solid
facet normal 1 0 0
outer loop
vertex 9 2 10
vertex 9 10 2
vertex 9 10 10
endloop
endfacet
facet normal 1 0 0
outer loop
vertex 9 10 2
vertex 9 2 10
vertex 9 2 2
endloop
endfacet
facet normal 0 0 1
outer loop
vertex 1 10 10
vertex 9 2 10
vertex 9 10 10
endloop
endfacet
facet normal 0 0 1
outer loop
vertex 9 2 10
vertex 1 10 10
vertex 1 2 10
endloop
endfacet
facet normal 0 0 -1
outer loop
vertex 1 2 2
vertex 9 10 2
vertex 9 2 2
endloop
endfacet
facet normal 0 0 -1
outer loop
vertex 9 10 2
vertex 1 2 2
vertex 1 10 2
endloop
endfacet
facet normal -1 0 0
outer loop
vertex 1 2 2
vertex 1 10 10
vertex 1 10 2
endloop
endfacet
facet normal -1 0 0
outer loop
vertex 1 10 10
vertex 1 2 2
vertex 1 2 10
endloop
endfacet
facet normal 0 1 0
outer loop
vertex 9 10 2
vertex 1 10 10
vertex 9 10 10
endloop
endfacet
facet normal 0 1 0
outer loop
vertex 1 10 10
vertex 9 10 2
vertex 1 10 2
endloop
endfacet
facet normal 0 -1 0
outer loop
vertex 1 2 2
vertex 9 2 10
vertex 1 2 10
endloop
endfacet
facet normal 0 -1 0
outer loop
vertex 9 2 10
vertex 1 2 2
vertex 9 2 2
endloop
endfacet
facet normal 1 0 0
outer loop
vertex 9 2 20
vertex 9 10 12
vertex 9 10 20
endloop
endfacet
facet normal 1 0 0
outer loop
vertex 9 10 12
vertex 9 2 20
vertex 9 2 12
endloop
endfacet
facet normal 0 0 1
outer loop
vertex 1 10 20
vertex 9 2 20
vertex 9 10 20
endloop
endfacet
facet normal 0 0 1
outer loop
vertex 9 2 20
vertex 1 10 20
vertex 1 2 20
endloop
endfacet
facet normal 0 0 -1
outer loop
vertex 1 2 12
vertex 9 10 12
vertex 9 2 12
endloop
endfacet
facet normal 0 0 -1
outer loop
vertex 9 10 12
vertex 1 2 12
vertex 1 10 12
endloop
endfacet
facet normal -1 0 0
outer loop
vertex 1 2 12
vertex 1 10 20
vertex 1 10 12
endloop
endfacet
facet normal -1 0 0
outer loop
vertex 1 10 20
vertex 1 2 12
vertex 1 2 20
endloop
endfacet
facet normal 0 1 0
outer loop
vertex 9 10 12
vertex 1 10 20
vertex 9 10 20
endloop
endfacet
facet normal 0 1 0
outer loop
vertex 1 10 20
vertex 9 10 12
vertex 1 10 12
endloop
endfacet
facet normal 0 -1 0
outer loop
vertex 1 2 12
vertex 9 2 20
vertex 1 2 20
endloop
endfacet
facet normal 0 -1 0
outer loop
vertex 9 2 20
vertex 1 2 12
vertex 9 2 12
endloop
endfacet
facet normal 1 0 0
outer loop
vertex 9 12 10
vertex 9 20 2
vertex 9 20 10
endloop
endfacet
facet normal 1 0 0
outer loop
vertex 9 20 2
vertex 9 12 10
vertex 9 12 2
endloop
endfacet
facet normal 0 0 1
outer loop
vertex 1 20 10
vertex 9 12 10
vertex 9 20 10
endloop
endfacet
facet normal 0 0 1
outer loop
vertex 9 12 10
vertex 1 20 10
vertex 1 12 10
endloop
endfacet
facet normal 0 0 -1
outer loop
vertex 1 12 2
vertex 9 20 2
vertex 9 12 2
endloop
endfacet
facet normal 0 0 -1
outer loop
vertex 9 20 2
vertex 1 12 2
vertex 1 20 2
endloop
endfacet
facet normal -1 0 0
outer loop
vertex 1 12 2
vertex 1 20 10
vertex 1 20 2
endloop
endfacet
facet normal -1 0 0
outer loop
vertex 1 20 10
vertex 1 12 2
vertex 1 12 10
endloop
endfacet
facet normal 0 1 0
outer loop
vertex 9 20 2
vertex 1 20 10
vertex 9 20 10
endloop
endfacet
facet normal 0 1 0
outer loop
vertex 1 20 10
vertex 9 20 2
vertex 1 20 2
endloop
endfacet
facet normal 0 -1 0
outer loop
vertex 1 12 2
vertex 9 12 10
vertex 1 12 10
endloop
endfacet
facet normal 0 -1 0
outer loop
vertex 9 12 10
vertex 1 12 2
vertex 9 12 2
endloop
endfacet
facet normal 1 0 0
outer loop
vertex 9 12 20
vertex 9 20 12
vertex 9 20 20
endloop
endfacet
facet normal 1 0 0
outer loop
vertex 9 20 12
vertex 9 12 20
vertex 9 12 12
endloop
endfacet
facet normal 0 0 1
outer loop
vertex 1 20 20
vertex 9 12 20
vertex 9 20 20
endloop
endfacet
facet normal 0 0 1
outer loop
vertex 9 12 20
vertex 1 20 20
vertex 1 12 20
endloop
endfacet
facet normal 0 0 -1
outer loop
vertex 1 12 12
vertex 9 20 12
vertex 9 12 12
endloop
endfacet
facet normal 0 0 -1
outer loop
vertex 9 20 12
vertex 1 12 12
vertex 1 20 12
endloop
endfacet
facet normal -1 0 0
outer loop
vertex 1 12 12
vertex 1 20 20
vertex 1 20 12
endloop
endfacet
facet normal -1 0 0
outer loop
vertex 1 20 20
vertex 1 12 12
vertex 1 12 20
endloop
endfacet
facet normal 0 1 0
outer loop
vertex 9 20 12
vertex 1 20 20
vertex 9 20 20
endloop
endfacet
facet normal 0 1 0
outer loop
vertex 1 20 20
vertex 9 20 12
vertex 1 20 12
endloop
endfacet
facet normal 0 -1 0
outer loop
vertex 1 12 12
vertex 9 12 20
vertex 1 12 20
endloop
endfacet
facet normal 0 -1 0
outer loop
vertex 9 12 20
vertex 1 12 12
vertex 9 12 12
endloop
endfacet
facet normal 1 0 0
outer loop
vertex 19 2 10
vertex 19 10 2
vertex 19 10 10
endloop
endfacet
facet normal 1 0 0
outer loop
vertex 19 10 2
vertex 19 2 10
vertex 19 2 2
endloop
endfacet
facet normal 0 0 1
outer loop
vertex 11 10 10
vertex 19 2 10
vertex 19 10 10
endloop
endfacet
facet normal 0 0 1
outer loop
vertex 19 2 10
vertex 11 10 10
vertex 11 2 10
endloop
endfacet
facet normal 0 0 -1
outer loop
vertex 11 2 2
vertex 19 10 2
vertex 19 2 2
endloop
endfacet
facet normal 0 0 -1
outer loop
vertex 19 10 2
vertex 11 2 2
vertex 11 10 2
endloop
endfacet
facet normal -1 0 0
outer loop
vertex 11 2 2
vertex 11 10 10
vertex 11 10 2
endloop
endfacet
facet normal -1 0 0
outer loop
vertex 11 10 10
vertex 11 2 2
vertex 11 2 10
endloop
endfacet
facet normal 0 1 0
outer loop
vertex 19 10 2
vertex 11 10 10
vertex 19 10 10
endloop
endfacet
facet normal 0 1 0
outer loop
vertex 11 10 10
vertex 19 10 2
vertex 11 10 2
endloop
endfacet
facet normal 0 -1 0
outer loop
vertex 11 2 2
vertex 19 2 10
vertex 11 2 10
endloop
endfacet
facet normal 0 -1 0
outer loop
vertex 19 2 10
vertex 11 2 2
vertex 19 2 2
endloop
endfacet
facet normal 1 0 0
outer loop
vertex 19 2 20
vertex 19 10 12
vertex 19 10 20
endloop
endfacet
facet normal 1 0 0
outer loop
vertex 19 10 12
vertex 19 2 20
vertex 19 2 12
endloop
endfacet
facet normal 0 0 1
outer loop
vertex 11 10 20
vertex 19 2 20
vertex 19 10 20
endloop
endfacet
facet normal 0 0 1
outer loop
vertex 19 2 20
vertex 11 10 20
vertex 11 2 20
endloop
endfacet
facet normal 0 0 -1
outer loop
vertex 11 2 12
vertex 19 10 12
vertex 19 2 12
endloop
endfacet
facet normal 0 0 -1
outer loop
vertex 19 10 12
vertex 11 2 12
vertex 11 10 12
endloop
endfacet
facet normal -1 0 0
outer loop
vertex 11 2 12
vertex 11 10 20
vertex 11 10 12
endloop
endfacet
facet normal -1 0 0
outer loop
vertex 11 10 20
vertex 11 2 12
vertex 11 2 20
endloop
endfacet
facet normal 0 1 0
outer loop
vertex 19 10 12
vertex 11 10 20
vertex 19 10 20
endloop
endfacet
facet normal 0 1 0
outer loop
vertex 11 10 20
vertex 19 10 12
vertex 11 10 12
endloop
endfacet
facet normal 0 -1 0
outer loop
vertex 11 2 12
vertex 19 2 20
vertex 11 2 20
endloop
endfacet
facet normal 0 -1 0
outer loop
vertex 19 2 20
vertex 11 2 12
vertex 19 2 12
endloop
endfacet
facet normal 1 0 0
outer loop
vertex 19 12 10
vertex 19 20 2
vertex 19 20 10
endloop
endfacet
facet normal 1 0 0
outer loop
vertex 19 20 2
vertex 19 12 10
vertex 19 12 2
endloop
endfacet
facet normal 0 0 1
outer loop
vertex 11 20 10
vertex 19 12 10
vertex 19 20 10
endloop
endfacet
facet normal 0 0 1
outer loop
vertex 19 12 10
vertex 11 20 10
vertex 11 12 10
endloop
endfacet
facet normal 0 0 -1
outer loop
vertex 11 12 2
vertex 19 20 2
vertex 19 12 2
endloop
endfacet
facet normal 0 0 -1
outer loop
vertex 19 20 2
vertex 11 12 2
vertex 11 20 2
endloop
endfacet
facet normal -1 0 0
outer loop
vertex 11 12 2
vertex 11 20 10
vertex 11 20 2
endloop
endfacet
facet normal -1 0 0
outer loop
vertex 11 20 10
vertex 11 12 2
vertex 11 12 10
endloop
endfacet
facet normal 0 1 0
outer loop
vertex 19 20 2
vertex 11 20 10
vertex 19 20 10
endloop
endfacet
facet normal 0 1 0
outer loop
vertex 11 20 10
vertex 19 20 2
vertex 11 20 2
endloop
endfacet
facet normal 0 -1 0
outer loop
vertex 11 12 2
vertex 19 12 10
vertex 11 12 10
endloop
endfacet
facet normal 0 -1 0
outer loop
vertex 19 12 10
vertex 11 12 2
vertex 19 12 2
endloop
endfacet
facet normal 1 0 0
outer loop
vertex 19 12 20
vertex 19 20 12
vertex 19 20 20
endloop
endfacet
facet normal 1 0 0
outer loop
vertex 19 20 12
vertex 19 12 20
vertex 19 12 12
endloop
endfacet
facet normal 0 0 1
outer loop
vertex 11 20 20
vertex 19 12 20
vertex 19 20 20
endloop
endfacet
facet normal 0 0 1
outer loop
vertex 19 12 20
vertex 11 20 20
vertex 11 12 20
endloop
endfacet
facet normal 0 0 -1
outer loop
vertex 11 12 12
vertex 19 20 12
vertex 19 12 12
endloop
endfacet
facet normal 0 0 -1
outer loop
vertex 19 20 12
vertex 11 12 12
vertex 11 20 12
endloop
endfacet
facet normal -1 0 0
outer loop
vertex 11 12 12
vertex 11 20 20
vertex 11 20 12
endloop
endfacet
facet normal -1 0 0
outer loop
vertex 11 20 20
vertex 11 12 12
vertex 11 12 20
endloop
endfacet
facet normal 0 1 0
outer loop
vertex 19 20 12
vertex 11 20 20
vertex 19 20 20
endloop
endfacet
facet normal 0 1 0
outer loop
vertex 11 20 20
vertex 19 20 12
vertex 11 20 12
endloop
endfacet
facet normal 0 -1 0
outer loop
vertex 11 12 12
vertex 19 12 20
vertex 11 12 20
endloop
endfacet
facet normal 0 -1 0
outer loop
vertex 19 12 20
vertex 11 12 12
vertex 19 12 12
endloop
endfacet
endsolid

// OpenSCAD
 /*
   Código para generar colores RGB en función de número de bits n por canal
   Cambiar el número de bits y previsualizar (F5)
   José Pujol
   Noviembre de 2018
   */
    bits=1;     // numero de bits por canal
    n=pow(2,bits); // numero de colores por canal
    
for (i = [1 : abs(1) : n]) {
  translate([(1 + (i-1) * 10), 1, 1]){
    for (j = [1 : abs(1) : n]) {
      translate([0, (1 + (j-1) * 10), 0]){
          for (k = [1 : abs(1) : n]) {
              translate([0, 0, (1 + (k-1) * 10)]){
            color([((i-1)/(n-1)),((j-1)/(n-1)),((k-1)/(n-1))]) {
          cube([8, 8, 8], center=false);
        }
      }
      }
    }

  }
}
    }
